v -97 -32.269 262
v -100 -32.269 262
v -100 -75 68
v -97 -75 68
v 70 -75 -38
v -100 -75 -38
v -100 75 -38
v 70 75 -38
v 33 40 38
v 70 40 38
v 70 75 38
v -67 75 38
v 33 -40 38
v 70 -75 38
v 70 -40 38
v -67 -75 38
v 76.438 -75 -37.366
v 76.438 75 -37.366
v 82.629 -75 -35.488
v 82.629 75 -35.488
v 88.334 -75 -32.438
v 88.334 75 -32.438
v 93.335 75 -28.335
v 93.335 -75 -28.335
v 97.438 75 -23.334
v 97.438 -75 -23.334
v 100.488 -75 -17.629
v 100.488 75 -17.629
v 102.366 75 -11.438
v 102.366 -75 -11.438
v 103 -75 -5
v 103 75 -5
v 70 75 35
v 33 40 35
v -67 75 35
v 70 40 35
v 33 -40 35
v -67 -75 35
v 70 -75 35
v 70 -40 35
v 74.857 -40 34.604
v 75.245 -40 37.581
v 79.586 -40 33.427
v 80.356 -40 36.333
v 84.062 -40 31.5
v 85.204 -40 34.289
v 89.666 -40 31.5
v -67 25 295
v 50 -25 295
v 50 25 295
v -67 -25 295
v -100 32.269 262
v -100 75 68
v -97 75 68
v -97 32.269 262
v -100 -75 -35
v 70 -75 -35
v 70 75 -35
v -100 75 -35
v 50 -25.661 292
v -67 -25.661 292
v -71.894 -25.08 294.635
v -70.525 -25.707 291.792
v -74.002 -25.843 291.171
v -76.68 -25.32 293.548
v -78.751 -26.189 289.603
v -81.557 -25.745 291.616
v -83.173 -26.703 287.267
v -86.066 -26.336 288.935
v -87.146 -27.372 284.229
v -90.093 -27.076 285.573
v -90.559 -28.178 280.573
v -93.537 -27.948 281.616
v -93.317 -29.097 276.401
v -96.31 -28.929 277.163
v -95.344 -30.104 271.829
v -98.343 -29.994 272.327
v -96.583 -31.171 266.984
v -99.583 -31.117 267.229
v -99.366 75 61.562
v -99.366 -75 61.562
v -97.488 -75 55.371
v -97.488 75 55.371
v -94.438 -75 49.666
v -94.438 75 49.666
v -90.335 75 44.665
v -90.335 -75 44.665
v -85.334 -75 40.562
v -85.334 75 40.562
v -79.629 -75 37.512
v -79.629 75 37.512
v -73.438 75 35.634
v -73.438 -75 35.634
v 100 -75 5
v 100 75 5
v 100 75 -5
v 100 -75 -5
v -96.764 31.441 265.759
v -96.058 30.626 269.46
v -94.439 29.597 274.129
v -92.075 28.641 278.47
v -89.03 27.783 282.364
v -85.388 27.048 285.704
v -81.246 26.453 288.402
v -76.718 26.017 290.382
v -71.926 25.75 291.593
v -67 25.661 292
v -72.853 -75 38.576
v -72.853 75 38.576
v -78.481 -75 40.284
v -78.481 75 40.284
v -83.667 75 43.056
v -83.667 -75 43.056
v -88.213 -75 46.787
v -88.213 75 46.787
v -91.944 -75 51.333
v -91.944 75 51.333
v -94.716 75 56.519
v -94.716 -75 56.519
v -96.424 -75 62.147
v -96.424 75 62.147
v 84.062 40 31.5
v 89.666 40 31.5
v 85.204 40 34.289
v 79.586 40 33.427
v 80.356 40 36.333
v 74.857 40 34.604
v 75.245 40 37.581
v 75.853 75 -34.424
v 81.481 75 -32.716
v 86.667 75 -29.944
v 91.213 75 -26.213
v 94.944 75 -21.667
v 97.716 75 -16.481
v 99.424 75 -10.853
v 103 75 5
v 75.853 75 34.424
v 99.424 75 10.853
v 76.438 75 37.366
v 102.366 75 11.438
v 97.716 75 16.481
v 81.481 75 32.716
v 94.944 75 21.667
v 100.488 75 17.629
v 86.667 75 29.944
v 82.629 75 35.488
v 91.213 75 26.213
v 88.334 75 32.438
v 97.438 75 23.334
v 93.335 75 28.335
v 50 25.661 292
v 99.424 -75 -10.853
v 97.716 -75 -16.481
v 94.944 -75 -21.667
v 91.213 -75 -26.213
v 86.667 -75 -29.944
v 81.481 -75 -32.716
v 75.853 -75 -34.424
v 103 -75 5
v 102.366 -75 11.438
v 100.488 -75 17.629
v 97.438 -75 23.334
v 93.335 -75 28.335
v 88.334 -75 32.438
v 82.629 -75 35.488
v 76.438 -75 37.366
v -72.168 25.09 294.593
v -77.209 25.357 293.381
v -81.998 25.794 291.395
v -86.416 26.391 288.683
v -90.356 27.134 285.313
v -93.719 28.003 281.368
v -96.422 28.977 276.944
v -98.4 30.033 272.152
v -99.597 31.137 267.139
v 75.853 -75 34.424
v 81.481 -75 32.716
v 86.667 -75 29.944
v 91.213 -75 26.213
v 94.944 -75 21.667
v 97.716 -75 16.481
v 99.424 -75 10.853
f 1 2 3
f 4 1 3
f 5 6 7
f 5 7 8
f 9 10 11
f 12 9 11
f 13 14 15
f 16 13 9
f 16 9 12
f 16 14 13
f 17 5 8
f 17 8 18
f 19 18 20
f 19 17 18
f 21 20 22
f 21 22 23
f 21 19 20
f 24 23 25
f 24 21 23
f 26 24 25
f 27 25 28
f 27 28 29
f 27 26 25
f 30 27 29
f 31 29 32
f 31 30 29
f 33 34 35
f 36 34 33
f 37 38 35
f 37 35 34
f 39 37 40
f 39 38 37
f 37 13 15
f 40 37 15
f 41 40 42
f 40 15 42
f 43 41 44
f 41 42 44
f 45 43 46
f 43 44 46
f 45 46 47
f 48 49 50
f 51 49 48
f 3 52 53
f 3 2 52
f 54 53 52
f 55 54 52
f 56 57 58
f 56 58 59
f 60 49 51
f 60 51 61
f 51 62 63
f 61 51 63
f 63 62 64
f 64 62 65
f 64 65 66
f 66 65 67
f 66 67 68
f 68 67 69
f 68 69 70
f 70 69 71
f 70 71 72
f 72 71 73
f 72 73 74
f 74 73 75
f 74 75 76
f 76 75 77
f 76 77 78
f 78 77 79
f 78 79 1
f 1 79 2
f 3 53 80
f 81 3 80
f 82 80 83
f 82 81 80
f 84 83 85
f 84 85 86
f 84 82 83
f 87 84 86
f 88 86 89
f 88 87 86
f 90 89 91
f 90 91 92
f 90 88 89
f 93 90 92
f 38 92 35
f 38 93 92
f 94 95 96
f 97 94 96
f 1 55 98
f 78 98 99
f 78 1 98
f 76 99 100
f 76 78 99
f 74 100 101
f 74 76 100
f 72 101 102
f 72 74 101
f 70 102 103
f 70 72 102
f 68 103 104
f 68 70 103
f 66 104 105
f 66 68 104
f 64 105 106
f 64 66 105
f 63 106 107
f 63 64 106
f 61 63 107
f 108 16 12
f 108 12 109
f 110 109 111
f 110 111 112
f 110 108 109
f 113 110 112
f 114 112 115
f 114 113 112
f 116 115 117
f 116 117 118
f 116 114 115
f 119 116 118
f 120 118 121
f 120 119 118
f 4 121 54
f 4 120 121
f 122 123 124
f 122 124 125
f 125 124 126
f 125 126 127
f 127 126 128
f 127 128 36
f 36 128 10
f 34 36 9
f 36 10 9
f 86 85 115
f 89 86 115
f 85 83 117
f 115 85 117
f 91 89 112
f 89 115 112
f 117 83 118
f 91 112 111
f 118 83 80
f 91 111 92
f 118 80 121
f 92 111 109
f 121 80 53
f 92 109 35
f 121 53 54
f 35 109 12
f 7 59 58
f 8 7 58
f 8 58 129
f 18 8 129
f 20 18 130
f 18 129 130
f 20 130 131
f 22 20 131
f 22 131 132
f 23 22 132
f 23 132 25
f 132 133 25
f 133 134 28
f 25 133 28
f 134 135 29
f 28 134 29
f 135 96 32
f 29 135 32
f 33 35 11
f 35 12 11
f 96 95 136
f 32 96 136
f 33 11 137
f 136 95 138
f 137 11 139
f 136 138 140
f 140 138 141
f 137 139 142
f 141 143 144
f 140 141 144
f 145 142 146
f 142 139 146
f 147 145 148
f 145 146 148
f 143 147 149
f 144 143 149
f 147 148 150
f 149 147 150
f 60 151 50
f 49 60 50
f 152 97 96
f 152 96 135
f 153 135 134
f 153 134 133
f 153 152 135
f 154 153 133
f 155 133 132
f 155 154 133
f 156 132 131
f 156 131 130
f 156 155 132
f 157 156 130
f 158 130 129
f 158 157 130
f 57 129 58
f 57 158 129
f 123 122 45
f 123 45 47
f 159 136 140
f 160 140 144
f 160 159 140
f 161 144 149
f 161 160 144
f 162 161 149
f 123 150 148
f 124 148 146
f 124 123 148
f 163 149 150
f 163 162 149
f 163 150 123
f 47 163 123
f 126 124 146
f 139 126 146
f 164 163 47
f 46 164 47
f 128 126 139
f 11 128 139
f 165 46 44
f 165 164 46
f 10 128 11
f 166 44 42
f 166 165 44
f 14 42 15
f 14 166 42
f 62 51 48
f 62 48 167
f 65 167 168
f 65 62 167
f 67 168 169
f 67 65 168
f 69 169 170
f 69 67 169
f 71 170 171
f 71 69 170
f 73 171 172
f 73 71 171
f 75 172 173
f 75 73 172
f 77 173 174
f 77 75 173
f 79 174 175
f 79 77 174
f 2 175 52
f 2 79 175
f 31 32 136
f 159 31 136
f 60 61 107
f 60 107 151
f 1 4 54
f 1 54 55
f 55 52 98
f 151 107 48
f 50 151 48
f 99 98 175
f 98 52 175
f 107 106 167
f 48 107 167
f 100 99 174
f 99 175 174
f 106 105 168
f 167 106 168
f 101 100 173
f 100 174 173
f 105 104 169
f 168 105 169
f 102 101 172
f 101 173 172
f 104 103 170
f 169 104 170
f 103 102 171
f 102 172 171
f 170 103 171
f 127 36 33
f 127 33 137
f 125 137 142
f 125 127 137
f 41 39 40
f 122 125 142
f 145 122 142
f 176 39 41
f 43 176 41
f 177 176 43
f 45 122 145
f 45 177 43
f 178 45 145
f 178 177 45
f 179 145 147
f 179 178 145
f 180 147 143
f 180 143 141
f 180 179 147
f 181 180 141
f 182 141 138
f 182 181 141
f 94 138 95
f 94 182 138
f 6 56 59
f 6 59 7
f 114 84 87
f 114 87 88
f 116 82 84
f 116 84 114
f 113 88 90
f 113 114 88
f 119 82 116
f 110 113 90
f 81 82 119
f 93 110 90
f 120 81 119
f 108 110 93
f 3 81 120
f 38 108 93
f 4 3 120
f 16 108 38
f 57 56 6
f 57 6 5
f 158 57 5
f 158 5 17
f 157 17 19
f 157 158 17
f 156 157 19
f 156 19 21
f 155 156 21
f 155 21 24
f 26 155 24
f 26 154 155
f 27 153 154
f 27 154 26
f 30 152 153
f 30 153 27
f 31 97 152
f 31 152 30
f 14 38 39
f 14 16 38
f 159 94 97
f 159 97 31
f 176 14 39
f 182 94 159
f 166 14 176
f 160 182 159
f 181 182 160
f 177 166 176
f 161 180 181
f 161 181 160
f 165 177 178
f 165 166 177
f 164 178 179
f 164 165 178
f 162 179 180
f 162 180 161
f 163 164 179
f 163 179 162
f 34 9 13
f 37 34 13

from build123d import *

# Parameters (mm, degrees)
F1_DEPTH = 75
F3_DEPTH = 200
F4_W     = 37
F4_H     = 40
F4_W_2   = 33
F5_DEPTH = 6.5


# Not quite as in the source:
# - a feature names something its author has since deleted; it is built from what else it names


with BuildPart() as f1:
    # F0 (on Front) → F1 (new body, symmetric)
    with BuildSketch(Plane.XZ):
        with BuildLine():
            Line((-67, 35), (70, 35))
            ThreePointArc((70, 35), (91.2132034356, 26.2132034356), (100, 5))
            Line((100, 5), (100, -5))
            ThreePointArc((100, -5), (91.2132034356, -26.2132034356), (70, -35))
            Line((70, -35), (-100, -35))
            Line((-100, -35), (-100, -38))
            Line((-100, -38), (70, -38))
            ThreePointArc((70, -38), (93.3345237792, -28.3345237792), (103, -5))
            Line((103, -5), (103, 5))
            ThreePointArc((103, 5), (93.3345237792, 28.3345237792), (70, 38))
            Line((70, 38), (-67, 38))
            ThreePointArc((-67, 38), (-88.2132034356, 46.7867965644), (-97, 68))
            Line((-97, 68), (-97, 262))
            ThreePointArc((-97, 262), (-88.2132034356, 283.2132034356), (-67, 292))
            Line((-67, 292), (50, 292))
            Line((50, 292), (50, 295))
            Line((50, 295), (-67, 295))
            ThreePointArc((-67, 295), (-90.3345237792, 285.3345237792), (-100, 262))
            Line((-100, 262), (-100, 68))
            ThreePointArc((-100, 68), (-90.3345237792, 44.6654762208), (-67, 35))
        make_face()
    extrude(amount=F1_DEPTH, both=True)

    # F2 (on face) → F3 (cut)
    with BuildSketch(Plane(origin=(-100, 0, 0), x_dir=(0, -1, 0), z_dir=(-1, 0, 0))):
        Polygon((-32.268722467, 262), (-75, 262), (-75, 68), align=None)
        Polygon((-75, 295), (-75, 262), (-32.268722467, 262), (-25, 295), align=None)
        Polygon((25, 295), (32.268722467, 262), (75, 262), (75, 295), align=None)
        Polygon((32.268722467, 262), (75, 68), (75, 262), align=None)
    extrude(amount=-F3_DEPTH, mode=Mode.SUBTRACT)

    # F4 (on face) → F5 (cut, symmetric)
    with BuildSketch(Plane.XY.offset(38)):
        with Locations((51.5, -20)):
            Rectangle(F4_W, F4_H)
        with Locations((86.5, -20)):
            Rectangle(F4_W_2, F4_H)
        with Locations((86.5, 20)):
            Rectangle(F4_W_2, F4_H)
        with Locations((51.5, 20)):
            Rectangle(F4_W, F4_H)
    extrude(amount=F5_DEPTH, both=True, mode=Mode.SUBTRACT)


solid = f1.part
